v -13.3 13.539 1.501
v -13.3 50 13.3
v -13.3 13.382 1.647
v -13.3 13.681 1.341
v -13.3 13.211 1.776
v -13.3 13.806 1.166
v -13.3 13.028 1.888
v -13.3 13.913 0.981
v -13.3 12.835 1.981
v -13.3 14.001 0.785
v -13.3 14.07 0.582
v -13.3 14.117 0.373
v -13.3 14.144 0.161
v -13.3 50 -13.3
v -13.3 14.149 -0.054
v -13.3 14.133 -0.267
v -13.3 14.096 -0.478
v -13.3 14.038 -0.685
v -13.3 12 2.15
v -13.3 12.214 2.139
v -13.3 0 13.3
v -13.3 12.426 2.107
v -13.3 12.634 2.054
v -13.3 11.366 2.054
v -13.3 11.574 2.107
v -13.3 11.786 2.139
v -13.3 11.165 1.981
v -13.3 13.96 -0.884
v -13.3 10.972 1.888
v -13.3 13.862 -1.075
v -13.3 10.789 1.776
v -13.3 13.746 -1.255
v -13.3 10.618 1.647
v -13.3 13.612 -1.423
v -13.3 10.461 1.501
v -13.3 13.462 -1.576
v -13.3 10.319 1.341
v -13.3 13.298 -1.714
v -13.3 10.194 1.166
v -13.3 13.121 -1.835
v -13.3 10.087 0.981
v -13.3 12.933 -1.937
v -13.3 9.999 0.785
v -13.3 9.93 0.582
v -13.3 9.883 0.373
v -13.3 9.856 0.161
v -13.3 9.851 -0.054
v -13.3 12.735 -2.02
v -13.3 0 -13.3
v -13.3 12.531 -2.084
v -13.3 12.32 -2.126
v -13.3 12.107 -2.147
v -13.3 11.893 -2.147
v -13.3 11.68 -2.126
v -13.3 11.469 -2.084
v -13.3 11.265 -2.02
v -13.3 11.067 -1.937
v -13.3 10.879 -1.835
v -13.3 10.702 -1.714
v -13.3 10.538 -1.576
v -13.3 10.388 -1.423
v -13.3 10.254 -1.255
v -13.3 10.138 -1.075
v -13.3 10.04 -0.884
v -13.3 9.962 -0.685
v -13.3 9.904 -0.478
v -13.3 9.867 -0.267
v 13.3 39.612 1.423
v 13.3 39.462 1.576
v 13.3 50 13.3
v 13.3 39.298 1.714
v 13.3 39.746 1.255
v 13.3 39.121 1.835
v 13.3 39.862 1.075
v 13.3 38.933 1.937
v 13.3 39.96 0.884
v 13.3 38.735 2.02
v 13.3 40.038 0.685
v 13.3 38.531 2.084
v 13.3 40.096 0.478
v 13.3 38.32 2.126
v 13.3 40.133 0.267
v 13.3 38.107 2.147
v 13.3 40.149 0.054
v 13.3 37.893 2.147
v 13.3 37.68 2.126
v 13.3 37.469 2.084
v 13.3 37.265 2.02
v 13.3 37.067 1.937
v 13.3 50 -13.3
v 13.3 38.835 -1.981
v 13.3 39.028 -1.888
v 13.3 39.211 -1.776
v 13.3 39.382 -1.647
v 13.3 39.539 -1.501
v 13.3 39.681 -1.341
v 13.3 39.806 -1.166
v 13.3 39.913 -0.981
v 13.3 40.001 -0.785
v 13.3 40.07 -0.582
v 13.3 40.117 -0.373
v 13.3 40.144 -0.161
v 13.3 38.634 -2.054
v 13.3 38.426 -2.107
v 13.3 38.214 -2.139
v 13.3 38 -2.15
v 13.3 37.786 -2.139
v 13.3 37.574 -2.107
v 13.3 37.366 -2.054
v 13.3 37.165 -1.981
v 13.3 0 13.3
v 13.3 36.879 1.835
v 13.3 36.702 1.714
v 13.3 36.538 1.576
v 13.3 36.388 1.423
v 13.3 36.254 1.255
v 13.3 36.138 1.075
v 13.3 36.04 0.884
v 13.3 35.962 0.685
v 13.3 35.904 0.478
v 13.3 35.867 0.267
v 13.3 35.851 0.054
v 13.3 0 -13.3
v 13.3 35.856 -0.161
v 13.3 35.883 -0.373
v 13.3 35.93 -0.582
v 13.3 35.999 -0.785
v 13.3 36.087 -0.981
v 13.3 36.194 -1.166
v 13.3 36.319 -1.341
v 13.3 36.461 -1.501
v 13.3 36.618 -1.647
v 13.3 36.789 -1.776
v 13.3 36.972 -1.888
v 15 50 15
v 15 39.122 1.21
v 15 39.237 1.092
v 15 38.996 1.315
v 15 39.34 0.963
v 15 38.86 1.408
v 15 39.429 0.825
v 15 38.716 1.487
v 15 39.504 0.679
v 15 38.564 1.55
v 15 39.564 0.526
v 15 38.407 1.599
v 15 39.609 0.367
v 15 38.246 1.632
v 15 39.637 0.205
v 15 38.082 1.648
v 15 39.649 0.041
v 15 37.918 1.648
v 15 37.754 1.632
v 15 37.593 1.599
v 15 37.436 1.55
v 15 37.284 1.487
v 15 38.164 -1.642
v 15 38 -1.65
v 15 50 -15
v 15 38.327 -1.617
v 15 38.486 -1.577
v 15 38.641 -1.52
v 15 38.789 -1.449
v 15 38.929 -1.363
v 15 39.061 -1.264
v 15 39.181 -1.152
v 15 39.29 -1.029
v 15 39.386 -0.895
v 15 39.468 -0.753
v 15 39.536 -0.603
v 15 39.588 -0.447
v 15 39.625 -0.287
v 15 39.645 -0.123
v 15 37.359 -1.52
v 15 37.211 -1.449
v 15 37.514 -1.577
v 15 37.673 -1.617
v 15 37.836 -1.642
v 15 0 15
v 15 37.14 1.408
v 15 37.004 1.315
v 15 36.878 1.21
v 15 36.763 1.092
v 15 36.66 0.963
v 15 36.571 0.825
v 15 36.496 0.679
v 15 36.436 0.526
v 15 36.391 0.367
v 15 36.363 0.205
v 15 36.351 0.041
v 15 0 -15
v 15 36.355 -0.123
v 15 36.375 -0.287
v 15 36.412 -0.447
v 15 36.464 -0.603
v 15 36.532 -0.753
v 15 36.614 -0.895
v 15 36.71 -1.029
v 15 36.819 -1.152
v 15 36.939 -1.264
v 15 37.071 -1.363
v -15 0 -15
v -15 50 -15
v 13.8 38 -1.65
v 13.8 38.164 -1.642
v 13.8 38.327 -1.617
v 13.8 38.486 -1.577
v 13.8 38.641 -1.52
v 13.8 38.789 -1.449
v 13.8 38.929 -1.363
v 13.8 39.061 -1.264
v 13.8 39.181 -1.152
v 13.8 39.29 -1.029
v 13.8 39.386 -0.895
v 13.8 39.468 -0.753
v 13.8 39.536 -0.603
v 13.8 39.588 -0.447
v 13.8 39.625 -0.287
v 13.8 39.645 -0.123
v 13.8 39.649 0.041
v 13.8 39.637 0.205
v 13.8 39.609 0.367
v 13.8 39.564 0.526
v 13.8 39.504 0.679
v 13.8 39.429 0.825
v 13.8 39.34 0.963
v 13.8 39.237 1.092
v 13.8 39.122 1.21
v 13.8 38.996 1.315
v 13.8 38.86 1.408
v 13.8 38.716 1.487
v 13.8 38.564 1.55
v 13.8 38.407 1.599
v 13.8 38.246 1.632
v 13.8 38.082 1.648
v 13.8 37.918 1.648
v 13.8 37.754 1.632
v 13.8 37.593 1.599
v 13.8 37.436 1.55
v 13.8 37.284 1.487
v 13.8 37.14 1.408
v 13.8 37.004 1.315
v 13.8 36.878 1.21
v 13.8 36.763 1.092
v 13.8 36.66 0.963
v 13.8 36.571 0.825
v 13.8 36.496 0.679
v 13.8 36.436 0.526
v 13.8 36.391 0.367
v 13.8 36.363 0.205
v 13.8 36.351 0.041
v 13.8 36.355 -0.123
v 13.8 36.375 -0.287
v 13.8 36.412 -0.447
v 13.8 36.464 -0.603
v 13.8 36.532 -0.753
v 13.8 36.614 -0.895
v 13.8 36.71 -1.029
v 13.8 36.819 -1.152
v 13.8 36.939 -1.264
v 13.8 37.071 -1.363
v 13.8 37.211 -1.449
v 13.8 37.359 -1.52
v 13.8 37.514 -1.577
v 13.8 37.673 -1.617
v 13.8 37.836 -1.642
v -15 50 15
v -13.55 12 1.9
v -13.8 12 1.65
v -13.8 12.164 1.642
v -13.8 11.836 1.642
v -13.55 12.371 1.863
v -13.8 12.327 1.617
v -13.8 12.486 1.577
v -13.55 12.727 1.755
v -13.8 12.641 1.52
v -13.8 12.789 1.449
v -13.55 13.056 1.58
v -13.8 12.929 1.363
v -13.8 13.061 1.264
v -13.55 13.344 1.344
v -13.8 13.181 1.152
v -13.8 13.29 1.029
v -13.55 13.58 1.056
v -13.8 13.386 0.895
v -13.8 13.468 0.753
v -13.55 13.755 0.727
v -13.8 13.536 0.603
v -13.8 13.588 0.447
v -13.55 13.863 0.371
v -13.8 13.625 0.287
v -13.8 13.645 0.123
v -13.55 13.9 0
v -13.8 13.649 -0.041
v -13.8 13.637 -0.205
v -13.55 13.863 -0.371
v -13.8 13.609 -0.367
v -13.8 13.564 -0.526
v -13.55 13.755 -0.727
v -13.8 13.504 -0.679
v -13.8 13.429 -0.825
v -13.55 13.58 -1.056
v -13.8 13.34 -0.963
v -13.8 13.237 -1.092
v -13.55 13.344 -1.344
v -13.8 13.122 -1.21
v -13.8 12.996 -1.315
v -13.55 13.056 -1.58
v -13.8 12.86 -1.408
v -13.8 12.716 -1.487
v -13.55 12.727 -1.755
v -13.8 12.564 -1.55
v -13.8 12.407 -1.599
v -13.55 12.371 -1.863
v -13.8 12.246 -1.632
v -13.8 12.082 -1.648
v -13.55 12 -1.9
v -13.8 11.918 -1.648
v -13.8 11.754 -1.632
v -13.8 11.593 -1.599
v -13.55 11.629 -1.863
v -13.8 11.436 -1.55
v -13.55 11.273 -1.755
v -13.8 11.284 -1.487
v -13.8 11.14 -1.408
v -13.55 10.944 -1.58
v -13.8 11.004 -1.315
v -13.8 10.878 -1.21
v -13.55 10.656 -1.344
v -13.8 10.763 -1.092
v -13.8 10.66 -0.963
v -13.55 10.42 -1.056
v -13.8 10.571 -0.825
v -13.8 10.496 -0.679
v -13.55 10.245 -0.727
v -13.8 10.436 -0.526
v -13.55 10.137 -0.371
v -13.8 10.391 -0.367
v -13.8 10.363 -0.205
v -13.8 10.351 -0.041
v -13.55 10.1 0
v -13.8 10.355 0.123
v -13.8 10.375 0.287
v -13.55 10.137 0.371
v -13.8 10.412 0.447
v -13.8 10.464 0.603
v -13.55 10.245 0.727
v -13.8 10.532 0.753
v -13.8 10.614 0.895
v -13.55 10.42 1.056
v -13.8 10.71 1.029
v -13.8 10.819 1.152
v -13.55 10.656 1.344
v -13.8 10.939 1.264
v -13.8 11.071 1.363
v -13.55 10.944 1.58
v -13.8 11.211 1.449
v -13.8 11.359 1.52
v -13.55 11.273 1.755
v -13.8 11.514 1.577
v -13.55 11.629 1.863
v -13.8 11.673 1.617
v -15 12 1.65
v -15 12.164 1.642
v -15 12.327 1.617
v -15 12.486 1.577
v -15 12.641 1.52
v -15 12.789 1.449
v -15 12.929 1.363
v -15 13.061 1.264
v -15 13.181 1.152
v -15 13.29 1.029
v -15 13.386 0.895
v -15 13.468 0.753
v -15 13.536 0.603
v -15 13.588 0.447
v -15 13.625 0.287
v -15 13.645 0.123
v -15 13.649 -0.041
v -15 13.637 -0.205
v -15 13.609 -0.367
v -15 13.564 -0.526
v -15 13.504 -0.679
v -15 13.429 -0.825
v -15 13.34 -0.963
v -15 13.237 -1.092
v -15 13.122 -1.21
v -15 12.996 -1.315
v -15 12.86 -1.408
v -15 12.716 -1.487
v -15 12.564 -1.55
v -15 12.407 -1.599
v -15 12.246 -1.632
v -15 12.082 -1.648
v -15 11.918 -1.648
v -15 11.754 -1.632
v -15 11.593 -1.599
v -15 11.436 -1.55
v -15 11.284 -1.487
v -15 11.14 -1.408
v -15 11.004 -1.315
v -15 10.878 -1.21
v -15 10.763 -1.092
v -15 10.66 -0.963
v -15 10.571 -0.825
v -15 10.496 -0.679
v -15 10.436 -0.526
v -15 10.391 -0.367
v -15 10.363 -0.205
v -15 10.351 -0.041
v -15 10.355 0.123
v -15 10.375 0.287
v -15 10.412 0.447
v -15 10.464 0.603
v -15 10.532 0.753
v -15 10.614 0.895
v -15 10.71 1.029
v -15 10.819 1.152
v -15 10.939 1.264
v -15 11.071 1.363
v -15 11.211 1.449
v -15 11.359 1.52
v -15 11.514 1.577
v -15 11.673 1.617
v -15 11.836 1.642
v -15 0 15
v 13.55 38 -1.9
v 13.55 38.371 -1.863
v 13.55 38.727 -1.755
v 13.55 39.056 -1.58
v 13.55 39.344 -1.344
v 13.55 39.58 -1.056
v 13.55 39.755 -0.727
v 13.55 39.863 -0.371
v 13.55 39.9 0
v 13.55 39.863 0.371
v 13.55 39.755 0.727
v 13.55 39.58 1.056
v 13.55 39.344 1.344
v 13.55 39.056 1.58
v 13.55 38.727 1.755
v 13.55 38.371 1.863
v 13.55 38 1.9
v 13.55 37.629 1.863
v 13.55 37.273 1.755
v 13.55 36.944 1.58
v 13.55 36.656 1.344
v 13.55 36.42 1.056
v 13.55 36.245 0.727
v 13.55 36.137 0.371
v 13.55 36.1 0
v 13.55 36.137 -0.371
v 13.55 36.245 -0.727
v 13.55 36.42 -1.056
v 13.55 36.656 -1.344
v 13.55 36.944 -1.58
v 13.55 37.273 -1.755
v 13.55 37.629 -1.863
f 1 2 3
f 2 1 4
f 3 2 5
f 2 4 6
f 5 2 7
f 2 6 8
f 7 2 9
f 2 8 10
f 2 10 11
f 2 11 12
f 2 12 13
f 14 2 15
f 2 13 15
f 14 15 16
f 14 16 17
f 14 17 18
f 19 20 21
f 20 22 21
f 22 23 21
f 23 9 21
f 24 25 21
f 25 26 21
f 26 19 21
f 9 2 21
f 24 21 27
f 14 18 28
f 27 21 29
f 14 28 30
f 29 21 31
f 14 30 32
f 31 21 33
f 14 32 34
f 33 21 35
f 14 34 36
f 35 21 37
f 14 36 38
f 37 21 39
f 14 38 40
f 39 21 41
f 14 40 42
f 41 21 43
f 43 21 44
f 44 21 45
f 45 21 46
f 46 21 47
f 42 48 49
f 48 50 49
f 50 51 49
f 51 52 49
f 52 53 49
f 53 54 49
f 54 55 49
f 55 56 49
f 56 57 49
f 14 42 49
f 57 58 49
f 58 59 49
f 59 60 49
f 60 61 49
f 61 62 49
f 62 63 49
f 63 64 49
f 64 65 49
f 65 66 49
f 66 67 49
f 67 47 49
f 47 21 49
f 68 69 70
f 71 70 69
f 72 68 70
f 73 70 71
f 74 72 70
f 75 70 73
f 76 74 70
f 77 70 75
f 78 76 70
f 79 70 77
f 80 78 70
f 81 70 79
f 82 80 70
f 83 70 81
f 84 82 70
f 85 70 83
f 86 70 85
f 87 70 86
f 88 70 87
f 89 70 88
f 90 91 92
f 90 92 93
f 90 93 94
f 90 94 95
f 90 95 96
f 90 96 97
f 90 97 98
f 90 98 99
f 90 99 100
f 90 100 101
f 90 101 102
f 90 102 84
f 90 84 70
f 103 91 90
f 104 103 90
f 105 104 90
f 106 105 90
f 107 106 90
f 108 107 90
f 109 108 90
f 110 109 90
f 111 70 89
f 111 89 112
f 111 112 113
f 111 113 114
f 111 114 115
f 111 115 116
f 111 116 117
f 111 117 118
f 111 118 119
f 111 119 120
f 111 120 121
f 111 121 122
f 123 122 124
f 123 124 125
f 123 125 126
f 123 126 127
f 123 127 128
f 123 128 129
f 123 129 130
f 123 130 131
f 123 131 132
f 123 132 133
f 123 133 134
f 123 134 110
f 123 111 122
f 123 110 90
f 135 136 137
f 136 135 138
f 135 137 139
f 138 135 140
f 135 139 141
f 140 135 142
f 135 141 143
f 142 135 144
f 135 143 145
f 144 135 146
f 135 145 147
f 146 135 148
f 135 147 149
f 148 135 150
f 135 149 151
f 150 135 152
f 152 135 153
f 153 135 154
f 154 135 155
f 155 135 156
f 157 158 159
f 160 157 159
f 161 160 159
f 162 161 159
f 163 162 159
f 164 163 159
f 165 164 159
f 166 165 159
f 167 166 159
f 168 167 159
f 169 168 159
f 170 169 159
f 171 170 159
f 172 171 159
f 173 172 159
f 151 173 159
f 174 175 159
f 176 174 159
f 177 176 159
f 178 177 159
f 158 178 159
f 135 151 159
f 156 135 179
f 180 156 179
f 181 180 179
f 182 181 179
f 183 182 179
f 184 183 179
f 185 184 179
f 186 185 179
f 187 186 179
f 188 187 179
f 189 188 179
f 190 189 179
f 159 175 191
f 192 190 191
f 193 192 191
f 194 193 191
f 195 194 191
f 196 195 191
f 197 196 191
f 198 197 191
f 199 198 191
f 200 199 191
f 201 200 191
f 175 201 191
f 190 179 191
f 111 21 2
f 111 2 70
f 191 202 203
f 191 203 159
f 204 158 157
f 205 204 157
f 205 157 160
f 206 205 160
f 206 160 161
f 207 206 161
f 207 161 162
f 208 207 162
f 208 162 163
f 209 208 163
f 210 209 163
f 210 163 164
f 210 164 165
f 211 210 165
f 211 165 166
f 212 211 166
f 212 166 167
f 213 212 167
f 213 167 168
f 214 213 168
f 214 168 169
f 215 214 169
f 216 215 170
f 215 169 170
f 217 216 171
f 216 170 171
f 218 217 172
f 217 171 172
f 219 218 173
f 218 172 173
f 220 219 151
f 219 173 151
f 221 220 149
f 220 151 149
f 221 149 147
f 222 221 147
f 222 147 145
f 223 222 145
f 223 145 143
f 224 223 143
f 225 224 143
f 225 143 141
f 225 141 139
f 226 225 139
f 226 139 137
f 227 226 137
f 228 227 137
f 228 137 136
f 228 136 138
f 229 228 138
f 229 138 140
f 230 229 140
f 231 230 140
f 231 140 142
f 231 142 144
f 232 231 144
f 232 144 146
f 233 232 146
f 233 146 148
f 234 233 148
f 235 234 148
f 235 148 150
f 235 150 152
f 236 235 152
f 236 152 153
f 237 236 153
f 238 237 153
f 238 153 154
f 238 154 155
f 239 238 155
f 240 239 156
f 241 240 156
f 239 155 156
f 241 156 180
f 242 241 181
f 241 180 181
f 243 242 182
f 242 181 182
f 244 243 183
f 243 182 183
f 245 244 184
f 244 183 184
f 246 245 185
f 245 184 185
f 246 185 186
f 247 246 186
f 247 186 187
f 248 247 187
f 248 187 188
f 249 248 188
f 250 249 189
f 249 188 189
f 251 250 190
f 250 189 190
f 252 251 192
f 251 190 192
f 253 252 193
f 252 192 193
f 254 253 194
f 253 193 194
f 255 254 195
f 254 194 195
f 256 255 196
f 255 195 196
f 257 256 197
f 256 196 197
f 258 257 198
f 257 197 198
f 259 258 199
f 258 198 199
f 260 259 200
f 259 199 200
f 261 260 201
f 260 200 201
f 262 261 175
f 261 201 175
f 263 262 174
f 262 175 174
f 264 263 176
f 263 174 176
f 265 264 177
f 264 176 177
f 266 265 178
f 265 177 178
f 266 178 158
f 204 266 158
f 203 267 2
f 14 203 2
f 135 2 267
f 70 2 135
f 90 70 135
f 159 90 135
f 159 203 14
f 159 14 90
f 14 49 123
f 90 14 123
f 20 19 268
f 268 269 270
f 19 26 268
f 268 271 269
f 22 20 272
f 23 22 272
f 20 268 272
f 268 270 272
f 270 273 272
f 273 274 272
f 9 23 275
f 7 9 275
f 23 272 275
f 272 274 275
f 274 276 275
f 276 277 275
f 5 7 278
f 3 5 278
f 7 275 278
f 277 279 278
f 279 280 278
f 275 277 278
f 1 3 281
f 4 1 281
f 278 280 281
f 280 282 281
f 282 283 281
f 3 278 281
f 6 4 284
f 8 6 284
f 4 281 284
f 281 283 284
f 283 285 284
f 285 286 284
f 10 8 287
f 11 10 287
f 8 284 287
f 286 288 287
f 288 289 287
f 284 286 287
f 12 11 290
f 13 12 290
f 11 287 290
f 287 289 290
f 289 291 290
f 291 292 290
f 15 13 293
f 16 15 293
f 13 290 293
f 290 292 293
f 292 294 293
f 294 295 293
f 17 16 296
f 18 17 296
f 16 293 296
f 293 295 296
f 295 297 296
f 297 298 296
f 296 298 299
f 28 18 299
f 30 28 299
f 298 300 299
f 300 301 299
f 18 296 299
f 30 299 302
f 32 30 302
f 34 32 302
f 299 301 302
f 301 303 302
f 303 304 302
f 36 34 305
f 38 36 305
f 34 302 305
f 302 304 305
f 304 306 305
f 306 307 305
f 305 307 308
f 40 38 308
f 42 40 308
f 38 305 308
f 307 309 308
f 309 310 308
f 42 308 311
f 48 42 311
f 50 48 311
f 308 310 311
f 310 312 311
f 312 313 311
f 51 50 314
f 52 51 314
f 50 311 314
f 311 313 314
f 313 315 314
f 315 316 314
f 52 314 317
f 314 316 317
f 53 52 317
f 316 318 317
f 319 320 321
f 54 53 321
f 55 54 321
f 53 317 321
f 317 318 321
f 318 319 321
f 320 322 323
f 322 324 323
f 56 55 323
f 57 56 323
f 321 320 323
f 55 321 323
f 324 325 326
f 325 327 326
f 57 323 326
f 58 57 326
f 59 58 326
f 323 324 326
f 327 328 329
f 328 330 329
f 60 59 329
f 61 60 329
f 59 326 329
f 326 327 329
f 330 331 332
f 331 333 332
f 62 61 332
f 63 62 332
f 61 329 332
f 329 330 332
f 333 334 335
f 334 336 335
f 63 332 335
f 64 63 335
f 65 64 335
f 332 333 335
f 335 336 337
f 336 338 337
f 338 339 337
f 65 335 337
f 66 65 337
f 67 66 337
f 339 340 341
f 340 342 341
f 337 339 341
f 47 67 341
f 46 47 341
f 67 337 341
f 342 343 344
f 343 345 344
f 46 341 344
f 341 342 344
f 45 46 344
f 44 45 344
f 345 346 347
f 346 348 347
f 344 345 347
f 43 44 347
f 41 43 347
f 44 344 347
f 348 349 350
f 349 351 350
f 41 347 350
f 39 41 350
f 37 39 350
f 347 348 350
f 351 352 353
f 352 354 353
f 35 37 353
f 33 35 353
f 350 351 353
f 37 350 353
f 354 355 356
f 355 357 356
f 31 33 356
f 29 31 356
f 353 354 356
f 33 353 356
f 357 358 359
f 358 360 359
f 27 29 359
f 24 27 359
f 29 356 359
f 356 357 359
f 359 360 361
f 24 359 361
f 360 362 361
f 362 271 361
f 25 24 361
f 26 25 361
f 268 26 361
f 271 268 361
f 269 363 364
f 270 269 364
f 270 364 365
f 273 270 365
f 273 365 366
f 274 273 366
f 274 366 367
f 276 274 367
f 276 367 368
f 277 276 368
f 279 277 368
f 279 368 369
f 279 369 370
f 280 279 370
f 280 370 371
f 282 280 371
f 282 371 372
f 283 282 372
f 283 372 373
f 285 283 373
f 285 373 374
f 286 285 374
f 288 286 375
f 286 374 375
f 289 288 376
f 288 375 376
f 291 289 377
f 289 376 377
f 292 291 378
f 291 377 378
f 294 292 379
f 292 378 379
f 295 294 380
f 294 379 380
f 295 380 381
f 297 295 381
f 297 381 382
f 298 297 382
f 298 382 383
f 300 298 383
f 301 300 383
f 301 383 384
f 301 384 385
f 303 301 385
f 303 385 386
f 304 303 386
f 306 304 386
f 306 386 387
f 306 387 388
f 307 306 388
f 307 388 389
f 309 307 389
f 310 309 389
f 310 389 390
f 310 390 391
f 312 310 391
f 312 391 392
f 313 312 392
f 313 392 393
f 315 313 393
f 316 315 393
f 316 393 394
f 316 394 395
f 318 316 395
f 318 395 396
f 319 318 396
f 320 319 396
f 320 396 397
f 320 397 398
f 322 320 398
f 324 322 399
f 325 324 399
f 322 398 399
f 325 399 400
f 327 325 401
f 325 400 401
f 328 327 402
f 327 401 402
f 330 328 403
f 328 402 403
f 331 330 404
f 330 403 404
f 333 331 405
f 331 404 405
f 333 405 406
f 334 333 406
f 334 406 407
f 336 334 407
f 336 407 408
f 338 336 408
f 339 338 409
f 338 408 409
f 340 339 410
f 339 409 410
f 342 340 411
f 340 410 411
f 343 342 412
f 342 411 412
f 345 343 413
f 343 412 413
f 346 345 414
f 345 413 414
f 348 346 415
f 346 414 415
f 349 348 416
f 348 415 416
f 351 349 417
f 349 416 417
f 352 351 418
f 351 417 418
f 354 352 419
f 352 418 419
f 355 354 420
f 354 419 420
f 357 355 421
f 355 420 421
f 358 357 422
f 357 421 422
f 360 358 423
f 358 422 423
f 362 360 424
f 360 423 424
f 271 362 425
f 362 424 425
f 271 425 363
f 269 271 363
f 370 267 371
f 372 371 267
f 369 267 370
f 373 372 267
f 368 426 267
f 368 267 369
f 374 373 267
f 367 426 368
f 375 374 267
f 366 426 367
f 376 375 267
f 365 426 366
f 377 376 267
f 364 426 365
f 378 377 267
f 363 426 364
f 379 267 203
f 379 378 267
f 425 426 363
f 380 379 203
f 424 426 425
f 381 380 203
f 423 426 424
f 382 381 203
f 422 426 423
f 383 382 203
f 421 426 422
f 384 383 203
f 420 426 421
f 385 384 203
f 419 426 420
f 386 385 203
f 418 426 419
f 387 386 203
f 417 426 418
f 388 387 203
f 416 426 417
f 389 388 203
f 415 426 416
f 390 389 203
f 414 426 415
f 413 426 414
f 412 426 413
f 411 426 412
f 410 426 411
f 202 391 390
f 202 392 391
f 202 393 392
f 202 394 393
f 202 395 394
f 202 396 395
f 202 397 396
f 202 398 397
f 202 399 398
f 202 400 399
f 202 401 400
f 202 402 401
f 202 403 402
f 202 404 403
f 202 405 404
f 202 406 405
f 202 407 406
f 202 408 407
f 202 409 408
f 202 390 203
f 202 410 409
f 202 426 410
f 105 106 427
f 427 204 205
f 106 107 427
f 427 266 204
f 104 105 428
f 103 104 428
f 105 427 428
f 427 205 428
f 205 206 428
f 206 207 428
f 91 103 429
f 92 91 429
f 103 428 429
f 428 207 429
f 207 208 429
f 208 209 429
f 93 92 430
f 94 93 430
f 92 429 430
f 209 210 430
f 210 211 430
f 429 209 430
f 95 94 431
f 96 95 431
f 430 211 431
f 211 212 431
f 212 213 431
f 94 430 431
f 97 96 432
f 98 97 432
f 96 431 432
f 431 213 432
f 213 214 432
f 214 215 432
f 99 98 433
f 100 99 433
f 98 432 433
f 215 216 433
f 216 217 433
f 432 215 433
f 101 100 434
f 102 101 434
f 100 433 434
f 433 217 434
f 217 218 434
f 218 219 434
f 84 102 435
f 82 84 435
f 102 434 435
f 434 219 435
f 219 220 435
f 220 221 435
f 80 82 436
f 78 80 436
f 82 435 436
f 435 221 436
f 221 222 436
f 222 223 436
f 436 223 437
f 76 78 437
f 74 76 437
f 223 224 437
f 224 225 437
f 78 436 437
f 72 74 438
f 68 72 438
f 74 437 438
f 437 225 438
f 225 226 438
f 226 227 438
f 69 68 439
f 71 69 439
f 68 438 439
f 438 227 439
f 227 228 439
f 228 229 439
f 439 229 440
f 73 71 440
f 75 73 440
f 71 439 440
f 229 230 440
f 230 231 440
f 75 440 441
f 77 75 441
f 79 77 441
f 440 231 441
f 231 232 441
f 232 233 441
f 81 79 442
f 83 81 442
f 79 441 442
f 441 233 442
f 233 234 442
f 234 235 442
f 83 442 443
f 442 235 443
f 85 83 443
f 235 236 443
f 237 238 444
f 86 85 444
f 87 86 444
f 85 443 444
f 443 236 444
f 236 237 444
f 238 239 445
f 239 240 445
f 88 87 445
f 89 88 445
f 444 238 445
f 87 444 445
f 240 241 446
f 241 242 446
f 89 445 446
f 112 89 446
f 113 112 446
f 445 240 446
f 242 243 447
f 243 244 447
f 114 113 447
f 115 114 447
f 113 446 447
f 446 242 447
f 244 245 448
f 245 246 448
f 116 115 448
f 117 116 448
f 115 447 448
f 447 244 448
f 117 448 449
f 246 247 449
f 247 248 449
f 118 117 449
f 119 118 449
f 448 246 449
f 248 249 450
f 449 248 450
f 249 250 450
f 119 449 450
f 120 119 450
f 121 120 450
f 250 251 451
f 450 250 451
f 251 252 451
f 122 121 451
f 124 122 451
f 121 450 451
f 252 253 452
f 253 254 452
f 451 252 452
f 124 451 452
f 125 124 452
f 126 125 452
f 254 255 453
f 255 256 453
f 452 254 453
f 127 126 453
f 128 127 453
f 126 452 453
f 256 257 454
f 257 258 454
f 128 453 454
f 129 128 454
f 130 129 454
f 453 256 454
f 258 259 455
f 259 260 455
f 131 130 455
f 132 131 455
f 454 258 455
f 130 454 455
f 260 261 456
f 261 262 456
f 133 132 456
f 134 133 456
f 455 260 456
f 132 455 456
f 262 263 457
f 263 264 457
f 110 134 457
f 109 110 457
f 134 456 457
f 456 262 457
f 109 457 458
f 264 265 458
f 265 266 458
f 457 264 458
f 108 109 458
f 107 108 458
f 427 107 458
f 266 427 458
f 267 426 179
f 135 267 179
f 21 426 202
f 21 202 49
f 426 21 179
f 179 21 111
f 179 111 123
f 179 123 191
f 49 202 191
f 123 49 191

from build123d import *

# Parameters (mm, degrees)
SKETCH1_W           = 30
SKETCH1_H           = 30
BOSS_EXTRUDE1_DEPTH = 50
SHELL1_T            = -1.7
SKETCH2_R           = 1.65
CUT_EXTRUDE1_DEPTH  = 2
SKETCH3_R           = 1.65
CUT_EXTRUDE2_DEPTH  = 2
CHAMFER1_SIZE       = 0.5
CHAMFER2_SIZE       = 0.5


with BuildPart() as part:
    # Sketch1 → Boss-Extrude1 (new body)
    with BuildSketch(Plane(origin=(0, 0, 0), x_dir=(1, 0, 0), z_dir=(0, 1, 0))):
        Rectangle(SKETCH1_W, SKETCH1_H)
    extrude(amount=BOSS_EXTRUDE1_DEPTH)

    # Shell1
    shell1_openings = [part.faces().sort_by_distance(p)[0] for p in [
        (0, 50, 0),
        (0, 0, 0),
    ]]
    offset(amount=SHELL1_T, openings=shell1_openings, kind=Kind.INTERSECTION)

    # Sketch2 → Cut-Extrude1 (cut)
    with BuildSketch(Plane.ZY.offset(15)):
        with Locations((0, 12)):
            Circle(SKETCH2_R)
    extrude(amount=-CUT_EXTRUDE1_DEPTH, mode=Mode.SUBTRACT)

    # Sketch3 → Cut-Extrude2 (cut)
    with BuildSketch(Plane(origin=(15, 0, 0), x_dir=(0, 0, -1), z_dir=(1, 0, 0))):
        with Locations((0, 38)):
            Circle(SKETCH3_R)
    extrude(amount=-CUT_EXTRUDE2_DEPTH, mode=Mode.SUBTRACT)

    # Chamfer1
    chamfer1_edges = [part.edges().sort_by_distance(p)[0] for p in [
        (13.3, 38, 1.65),
    ]]
    chamfer(chamfer1_edges, length=CHAMFER1_SIZE)

    # Chamfer2
    chamfer2_edges = [part.edges().sort_by_distance(p)[0] for p in [
        (-13.3, 12, -1.65),
    ]]
    chamfer(chamfer2_edges, length=CHAMFER2_SIZE)


solid = part.part
